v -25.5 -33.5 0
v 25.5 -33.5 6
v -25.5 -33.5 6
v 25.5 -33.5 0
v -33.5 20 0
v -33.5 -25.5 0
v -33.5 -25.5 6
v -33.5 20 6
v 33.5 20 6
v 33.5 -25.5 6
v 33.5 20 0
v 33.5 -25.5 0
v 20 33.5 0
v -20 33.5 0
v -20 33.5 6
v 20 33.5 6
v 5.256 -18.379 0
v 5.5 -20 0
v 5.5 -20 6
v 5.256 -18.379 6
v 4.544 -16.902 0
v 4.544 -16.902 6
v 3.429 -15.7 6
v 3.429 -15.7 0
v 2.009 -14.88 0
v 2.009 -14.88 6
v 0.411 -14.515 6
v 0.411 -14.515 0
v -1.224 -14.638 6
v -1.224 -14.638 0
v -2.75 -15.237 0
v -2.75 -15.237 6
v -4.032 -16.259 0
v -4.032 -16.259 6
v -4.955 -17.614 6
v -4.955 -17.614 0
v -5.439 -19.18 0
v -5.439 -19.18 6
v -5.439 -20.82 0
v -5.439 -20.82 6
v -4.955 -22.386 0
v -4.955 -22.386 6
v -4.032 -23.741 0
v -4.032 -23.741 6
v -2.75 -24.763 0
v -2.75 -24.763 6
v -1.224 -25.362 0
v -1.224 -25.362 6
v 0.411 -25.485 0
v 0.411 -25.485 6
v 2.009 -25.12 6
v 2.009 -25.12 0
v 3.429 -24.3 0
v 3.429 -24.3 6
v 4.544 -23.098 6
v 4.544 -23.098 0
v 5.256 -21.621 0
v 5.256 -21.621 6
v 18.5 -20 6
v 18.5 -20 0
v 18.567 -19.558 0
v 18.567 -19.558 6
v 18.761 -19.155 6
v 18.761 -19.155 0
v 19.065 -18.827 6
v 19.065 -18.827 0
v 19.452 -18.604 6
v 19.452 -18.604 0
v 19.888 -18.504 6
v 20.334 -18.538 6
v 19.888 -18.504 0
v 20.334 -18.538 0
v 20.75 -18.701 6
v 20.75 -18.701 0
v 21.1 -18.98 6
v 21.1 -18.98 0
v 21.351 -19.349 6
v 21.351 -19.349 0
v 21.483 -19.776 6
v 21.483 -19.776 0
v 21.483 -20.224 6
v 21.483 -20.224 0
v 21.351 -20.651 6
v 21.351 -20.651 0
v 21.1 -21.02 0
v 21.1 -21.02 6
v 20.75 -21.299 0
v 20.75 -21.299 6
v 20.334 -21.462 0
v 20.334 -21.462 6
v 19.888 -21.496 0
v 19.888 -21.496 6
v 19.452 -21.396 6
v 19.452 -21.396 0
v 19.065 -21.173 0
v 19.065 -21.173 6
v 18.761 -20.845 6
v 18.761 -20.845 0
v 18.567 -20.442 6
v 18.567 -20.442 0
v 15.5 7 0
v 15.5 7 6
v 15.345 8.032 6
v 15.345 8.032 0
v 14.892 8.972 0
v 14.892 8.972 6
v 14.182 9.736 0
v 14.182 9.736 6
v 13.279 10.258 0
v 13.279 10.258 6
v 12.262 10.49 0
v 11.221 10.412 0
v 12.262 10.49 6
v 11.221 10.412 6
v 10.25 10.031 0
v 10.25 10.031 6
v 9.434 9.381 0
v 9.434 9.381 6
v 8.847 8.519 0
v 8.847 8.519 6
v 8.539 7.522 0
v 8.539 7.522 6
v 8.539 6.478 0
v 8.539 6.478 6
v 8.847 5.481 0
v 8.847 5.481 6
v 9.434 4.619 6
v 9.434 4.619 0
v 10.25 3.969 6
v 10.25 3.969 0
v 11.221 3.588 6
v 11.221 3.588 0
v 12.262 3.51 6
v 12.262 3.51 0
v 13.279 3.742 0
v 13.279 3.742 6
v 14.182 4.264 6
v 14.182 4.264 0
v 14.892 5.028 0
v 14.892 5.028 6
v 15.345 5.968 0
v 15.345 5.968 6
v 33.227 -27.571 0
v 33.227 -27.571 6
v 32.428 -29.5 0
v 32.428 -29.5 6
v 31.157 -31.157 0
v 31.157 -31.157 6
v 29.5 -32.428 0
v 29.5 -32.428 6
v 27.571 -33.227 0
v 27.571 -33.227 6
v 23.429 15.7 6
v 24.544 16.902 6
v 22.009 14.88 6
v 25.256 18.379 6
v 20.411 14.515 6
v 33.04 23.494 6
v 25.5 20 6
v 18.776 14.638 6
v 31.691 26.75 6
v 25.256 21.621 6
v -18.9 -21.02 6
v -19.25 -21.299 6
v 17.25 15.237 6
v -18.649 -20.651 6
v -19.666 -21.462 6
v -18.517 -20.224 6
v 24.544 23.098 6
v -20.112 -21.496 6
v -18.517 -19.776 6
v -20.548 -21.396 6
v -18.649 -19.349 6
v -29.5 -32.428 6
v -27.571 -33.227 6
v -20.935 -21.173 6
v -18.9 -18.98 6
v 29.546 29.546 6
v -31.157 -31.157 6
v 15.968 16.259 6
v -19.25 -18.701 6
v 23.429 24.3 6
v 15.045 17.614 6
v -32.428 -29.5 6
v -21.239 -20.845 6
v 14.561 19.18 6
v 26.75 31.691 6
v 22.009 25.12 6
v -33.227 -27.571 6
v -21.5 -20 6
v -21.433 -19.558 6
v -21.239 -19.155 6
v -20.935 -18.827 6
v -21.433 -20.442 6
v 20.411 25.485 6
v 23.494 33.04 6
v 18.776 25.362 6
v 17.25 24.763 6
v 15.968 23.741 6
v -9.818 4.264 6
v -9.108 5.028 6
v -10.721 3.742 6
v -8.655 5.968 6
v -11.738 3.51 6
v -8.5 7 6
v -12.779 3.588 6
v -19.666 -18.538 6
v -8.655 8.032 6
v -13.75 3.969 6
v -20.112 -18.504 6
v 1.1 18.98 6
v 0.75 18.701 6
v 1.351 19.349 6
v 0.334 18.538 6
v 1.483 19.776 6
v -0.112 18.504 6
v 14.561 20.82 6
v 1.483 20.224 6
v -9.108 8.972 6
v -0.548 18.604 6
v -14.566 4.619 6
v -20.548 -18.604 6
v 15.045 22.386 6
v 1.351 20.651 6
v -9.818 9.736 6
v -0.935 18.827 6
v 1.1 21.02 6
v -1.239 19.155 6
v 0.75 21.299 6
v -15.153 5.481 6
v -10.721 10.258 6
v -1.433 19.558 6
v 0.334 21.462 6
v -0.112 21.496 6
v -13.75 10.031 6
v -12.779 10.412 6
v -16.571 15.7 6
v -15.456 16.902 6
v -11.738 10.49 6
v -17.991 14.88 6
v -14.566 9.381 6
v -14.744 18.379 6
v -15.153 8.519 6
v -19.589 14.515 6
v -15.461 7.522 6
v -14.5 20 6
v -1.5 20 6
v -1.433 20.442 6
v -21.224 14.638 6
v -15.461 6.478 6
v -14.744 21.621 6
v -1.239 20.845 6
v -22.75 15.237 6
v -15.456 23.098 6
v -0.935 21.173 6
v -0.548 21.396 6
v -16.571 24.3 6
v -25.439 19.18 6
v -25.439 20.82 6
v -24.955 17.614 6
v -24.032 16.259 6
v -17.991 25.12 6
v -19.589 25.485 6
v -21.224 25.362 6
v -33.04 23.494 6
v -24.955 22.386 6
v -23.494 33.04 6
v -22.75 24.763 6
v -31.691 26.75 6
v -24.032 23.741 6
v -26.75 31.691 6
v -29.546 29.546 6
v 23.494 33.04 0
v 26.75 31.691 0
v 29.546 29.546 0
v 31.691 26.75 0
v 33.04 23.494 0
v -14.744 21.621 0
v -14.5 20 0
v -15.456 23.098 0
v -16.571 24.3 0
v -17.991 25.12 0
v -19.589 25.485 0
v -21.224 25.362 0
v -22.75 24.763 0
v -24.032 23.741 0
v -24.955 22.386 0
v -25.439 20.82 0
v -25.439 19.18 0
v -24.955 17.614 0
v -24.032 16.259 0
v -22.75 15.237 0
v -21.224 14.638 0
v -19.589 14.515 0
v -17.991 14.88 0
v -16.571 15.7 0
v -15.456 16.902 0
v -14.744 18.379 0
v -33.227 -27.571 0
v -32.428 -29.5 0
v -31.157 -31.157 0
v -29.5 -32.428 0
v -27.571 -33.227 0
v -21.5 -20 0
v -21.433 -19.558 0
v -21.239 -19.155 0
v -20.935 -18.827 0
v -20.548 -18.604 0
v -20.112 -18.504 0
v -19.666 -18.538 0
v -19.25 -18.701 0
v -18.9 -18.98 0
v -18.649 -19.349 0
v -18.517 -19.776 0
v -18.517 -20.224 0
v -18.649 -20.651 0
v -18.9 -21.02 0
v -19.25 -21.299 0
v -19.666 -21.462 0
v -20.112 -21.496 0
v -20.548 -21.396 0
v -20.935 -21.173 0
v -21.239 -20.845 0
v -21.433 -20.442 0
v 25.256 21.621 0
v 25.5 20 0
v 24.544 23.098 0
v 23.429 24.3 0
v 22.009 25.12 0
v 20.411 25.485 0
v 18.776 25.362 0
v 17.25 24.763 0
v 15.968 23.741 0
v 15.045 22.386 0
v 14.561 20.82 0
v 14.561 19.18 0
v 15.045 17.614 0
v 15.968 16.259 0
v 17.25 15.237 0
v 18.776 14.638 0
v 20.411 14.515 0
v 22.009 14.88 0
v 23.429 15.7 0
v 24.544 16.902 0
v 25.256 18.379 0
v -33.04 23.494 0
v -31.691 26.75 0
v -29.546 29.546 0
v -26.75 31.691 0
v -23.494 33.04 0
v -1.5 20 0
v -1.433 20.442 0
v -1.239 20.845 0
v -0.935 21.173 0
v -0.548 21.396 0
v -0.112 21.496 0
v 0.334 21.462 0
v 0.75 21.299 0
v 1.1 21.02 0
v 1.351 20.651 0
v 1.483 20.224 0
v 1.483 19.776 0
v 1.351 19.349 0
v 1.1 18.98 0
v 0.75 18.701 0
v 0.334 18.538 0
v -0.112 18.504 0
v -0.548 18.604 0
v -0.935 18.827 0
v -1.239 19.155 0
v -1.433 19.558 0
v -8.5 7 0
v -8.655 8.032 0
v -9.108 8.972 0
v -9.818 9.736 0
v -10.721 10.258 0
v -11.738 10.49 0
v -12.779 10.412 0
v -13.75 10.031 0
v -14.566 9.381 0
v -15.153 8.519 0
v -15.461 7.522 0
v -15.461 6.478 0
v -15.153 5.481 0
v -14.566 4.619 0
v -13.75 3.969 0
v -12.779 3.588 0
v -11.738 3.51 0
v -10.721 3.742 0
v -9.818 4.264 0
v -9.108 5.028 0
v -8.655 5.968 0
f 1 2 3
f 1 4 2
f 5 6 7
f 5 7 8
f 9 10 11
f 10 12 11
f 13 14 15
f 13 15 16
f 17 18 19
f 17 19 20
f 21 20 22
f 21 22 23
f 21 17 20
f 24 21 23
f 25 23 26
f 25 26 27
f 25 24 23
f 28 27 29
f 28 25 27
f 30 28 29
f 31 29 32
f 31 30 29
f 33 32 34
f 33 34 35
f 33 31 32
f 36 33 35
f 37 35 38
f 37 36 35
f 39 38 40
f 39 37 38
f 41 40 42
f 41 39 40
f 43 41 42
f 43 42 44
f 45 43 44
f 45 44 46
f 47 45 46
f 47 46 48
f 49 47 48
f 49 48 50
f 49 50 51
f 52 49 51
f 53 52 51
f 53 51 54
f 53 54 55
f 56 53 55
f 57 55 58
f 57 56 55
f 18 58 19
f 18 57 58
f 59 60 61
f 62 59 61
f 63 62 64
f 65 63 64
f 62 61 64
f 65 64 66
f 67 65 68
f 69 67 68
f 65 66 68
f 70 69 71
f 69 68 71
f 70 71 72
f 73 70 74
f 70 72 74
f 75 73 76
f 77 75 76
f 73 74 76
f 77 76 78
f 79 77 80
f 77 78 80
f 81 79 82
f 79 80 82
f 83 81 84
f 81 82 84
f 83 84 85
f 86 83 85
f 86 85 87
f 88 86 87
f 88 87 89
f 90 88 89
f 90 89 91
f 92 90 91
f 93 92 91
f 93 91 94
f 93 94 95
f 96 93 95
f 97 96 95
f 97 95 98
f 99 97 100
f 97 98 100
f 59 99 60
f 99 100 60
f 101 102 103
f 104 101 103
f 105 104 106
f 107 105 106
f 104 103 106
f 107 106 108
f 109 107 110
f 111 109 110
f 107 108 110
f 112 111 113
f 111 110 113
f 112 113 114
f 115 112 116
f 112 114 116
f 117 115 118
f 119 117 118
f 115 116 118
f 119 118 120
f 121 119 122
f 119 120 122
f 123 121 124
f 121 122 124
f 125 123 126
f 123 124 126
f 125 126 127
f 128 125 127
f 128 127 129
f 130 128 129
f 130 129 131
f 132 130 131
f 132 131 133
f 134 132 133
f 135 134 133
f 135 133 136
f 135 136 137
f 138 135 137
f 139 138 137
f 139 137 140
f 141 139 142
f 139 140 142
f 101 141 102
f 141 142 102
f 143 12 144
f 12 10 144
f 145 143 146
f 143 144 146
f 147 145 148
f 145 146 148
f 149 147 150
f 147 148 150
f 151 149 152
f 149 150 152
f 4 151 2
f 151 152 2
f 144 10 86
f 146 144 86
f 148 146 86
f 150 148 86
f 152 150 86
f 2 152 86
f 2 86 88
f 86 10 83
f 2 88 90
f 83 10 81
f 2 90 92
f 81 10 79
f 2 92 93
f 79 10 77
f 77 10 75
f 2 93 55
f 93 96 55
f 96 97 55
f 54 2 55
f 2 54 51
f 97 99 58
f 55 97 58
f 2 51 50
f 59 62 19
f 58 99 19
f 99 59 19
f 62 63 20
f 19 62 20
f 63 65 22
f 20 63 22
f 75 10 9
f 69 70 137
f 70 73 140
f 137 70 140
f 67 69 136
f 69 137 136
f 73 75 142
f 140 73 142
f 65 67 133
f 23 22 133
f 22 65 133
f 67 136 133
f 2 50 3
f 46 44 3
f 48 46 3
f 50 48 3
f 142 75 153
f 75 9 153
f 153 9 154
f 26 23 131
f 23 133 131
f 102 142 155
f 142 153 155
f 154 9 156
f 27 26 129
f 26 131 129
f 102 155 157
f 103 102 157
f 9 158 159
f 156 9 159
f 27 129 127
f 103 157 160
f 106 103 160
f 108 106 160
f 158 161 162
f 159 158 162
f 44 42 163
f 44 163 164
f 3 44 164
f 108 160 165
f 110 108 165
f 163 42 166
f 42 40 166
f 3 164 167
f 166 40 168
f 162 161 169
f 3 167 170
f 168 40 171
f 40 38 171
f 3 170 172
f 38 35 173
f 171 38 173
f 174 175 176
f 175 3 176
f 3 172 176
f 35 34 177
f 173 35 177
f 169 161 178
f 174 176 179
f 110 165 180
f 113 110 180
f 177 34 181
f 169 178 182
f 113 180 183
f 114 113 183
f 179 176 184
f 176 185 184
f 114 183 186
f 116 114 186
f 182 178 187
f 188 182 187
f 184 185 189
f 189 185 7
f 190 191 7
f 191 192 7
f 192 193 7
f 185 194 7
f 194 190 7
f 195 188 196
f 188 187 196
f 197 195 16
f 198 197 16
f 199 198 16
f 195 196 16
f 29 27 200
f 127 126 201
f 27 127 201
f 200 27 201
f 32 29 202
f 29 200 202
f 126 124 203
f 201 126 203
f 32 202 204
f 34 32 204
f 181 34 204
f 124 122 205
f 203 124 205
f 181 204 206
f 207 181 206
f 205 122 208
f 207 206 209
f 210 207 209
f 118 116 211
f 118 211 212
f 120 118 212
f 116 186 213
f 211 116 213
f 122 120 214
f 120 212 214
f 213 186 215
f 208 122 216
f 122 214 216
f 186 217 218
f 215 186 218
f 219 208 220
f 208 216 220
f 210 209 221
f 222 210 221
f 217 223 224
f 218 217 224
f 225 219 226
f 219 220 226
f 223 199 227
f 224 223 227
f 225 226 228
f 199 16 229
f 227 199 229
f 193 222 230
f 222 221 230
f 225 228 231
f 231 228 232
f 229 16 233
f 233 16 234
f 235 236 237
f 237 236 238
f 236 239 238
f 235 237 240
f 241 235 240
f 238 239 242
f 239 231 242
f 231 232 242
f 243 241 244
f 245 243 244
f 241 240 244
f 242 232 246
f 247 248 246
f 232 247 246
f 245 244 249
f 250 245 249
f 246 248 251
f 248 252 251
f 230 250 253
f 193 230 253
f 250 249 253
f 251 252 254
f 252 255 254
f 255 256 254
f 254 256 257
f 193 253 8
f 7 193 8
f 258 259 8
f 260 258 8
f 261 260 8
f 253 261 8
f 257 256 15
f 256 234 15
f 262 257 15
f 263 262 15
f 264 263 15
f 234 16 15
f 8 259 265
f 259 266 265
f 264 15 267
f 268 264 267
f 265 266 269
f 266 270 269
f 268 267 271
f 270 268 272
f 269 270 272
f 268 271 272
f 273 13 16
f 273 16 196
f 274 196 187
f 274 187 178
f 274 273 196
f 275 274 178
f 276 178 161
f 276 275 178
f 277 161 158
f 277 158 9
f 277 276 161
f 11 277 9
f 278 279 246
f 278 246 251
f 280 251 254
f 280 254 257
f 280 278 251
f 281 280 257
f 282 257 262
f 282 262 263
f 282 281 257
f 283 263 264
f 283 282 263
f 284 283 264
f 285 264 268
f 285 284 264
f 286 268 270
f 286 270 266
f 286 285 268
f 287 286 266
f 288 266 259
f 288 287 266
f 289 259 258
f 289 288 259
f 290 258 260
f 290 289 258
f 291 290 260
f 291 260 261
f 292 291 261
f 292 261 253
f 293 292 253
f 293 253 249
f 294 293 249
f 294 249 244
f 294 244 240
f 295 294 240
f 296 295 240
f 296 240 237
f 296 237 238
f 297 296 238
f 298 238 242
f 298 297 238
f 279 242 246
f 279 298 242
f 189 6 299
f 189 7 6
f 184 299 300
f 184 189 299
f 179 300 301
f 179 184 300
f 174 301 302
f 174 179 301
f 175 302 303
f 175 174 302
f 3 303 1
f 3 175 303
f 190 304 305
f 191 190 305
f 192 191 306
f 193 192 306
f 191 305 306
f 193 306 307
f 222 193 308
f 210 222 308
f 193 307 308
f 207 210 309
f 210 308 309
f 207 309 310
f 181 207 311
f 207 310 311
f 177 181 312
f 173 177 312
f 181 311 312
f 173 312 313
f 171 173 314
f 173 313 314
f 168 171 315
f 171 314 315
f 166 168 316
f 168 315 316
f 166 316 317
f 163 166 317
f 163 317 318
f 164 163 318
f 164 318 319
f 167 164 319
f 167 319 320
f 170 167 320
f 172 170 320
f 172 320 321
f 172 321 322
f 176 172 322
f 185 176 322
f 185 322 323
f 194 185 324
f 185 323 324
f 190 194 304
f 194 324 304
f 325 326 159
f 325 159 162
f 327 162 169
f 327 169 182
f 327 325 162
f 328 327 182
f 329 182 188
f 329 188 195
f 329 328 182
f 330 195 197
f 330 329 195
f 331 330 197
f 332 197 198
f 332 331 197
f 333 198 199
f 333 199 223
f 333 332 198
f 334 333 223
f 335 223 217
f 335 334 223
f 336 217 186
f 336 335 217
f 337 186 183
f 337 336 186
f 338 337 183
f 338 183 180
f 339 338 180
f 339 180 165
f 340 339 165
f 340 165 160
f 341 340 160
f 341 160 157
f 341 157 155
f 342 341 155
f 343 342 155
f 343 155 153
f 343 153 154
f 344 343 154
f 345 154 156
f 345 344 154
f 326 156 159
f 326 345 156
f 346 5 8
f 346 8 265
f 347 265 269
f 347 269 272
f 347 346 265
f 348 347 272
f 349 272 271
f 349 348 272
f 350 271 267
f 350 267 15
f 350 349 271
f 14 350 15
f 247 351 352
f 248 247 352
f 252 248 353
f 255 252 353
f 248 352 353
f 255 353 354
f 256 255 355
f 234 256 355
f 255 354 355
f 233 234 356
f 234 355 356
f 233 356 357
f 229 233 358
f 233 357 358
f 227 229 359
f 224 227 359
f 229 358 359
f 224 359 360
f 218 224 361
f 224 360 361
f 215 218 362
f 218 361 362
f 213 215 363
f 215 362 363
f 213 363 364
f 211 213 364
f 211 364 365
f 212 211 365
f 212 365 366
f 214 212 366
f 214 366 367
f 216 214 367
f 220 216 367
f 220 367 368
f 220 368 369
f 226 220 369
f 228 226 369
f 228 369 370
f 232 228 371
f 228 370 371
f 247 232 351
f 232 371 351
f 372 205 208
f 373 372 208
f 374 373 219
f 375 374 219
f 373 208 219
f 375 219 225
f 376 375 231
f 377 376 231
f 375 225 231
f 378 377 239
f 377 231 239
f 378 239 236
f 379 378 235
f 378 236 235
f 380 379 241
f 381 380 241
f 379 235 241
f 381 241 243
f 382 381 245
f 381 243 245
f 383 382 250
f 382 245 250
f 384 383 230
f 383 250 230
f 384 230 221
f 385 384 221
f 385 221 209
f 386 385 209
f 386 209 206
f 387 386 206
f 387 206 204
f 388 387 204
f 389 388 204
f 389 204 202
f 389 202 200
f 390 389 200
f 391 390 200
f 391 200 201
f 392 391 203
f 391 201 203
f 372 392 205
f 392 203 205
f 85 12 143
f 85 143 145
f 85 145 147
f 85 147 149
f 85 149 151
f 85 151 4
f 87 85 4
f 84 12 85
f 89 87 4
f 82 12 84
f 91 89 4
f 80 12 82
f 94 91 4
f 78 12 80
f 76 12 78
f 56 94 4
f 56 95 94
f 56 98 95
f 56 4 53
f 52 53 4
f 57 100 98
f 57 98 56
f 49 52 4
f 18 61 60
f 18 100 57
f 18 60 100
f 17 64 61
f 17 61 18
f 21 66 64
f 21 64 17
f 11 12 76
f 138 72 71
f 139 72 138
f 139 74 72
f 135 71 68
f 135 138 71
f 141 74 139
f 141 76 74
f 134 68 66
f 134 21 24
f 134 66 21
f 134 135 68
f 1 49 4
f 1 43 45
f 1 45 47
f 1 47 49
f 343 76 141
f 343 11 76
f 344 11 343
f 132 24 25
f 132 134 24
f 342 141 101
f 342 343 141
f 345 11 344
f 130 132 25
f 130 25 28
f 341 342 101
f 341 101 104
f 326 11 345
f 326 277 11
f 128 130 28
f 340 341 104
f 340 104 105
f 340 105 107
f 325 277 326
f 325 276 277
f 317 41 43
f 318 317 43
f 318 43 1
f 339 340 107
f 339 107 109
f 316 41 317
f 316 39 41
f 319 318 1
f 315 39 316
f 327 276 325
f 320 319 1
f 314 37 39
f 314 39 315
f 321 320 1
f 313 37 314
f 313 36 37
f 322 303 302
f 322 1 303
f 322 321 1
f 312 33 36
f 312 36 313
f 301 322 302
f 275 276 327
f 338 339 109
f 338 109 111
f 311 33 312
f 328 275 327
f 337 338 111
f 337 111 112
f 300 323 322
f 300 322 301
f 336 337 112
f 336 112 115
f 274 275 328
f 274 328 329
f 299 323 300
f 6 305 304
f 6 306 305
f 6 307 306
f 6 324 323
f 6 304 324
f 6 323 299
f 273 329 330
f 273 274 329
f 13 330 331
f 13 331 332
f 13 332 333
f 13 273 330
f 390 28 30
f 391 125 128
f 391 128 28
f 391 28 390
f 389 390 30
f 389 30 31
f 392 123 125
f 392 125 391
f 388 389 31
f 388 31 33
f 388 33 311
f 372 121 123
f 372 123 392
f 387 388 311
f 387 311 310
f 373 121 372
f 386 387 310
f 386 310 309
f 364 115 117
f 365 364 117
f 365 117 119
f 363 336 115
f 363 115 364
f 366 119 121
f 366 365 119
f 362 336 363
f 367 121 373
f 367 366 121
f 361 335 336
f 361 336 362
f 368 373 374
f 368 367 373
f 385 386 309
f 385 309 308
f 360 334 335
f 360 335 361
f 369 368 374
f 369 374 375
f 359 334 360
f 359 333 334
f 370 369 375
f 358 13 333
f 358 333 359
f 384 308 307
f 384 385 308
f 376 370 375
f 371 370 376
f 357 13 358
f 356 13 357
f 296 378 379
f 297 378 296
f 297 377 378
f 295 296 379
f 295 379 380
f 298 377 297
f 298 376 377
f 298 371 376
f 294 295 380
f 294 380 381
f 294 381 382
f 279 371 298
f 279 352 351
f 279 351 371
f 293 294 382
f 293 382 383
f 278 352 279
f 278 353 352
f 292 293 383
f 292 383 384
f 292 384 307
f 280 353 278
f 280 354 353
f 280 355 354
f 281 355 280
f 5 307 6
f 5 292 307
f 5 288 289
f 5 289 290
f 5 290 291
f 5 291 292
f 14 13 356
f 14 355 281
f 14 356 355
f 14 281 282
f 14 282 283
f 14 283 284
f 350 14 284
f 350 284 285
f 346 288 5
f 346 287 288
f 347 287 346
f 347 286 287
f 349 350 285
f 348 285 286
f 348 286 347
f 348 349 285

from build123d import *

# Parameters (mm, degrees)
ESBO_O1_R                = 5.5
RESSALTO_EXTRUS_O1_DEPTH = 6
ESBO_O2_W                = 13.5
ESBO_O2_H                = 13.5
RESSALTO_EXTRUS_O2_DEPTH = 6
FILETE1_R                = 8
ESBO_O3_R                = 1.5
CORTE_EXTRUS_O1_DEPTH    = 6
ESBO_O5_R                = 3.5
CORTE_EXTRUS_O2_DEPTH    = 6


with BuildPart() as part:
    # Esboço1 → Ressalto-extrusão1 (new body)
    with BuildSketch(Plane.XY):
        with BuildLine():
            Line((-20, 33.5), (20, 33.5))
            ThreePointArc((20, 33.5), (29.545941546, 29.545941546), (33.5, 20))
            Line((33.5, 20), (33.5, -20))
            ThreePointArc((33.5, -20), (29.545941546, -29.545941546), (20, -33.5))
            Line((20, -33.5), (-20, -33.5))
            ThreePointArc((-20, -33.5), (-29.545941546, -29.545941546), (-33.5, -20))
            Line((-33.5, -20), (-33.5, 20))
            ThreePointArc((-33.5, 20), (-29.545941546, 29.545941546), (-20, 33.5))
        make_face()
        with Locations((-20, 20)):
            Circle(ESBO_O1_R, mode=Mode.SUBTRACT)
        with Locations((20, 20)):
            Circle(ESBO_O1_R, mode=Mode.SUBTRACT)
        with Locations((0, -20)):
            Circle(ESBO_O1_R, mode=Mode.SUBTRACT)
    extrude(amount=RESSALTO_EXTRUS_O1_DEPTH)

    # Esboço2 → Ressalto-extrusão2 (add)
    with BuildSketch(Plane(origin=(0, 0, 0), x_dir=(-1, 0, 0), z_dir=(0, 0, -1))):
        with Locations((-26.75, -26.75)):
            Rectangle(ESBO_O2_W, ESBO_O2_H)
        with Locations((26.75, -26.75)):
            Rectangle(ESBO_O2_W, ESBO_O2_H)
    extrude(amount=-RESSALTO_EXTRUS_O2_DEPTH)

    # Filete1
    filete1_edges = [part.edges().sort_by_distance(p)[0] for p in [
        (33.5, -33.5, 3),
        (-33.5, -33.5, 3),
    ]]
    fillet(filete1_edges, radius=FILETE1_R)

    # Esboço3 → Corte-extrusão1 (cut)
    with BuildSketch(Plane(origin=(0, 0, 0), x_dir=(-1, 0, 0), z_dir=(0, 0, -1))):
        with Locations((0, 20)):
            Circle(ESBO_O3_R)
        with Locations((20, -20)):
            Circle(ESBO_O3_R)
        with Locations((-20, -20)):
            Circle(ESBO_O3_R)
    extrude(amount=-CORTE_EXTRUS_O1_DEPTH, mode=Mode.SUBTRACT)

    # Esboço5 → Corte-extrusão2 (cut)
    with BuildSketch(Plane.XY.offset(6)):
        with Locations((-12, 7)):
            Circle(ESBO_O5_R)
        with Locations((12, 7)):
            Circle(ESBO_O5_R)
    extrude(amount=-CORTE_EXTRUS_O2_DEPTH, mode=Mode.SUBTRACT)


solid = part.part
